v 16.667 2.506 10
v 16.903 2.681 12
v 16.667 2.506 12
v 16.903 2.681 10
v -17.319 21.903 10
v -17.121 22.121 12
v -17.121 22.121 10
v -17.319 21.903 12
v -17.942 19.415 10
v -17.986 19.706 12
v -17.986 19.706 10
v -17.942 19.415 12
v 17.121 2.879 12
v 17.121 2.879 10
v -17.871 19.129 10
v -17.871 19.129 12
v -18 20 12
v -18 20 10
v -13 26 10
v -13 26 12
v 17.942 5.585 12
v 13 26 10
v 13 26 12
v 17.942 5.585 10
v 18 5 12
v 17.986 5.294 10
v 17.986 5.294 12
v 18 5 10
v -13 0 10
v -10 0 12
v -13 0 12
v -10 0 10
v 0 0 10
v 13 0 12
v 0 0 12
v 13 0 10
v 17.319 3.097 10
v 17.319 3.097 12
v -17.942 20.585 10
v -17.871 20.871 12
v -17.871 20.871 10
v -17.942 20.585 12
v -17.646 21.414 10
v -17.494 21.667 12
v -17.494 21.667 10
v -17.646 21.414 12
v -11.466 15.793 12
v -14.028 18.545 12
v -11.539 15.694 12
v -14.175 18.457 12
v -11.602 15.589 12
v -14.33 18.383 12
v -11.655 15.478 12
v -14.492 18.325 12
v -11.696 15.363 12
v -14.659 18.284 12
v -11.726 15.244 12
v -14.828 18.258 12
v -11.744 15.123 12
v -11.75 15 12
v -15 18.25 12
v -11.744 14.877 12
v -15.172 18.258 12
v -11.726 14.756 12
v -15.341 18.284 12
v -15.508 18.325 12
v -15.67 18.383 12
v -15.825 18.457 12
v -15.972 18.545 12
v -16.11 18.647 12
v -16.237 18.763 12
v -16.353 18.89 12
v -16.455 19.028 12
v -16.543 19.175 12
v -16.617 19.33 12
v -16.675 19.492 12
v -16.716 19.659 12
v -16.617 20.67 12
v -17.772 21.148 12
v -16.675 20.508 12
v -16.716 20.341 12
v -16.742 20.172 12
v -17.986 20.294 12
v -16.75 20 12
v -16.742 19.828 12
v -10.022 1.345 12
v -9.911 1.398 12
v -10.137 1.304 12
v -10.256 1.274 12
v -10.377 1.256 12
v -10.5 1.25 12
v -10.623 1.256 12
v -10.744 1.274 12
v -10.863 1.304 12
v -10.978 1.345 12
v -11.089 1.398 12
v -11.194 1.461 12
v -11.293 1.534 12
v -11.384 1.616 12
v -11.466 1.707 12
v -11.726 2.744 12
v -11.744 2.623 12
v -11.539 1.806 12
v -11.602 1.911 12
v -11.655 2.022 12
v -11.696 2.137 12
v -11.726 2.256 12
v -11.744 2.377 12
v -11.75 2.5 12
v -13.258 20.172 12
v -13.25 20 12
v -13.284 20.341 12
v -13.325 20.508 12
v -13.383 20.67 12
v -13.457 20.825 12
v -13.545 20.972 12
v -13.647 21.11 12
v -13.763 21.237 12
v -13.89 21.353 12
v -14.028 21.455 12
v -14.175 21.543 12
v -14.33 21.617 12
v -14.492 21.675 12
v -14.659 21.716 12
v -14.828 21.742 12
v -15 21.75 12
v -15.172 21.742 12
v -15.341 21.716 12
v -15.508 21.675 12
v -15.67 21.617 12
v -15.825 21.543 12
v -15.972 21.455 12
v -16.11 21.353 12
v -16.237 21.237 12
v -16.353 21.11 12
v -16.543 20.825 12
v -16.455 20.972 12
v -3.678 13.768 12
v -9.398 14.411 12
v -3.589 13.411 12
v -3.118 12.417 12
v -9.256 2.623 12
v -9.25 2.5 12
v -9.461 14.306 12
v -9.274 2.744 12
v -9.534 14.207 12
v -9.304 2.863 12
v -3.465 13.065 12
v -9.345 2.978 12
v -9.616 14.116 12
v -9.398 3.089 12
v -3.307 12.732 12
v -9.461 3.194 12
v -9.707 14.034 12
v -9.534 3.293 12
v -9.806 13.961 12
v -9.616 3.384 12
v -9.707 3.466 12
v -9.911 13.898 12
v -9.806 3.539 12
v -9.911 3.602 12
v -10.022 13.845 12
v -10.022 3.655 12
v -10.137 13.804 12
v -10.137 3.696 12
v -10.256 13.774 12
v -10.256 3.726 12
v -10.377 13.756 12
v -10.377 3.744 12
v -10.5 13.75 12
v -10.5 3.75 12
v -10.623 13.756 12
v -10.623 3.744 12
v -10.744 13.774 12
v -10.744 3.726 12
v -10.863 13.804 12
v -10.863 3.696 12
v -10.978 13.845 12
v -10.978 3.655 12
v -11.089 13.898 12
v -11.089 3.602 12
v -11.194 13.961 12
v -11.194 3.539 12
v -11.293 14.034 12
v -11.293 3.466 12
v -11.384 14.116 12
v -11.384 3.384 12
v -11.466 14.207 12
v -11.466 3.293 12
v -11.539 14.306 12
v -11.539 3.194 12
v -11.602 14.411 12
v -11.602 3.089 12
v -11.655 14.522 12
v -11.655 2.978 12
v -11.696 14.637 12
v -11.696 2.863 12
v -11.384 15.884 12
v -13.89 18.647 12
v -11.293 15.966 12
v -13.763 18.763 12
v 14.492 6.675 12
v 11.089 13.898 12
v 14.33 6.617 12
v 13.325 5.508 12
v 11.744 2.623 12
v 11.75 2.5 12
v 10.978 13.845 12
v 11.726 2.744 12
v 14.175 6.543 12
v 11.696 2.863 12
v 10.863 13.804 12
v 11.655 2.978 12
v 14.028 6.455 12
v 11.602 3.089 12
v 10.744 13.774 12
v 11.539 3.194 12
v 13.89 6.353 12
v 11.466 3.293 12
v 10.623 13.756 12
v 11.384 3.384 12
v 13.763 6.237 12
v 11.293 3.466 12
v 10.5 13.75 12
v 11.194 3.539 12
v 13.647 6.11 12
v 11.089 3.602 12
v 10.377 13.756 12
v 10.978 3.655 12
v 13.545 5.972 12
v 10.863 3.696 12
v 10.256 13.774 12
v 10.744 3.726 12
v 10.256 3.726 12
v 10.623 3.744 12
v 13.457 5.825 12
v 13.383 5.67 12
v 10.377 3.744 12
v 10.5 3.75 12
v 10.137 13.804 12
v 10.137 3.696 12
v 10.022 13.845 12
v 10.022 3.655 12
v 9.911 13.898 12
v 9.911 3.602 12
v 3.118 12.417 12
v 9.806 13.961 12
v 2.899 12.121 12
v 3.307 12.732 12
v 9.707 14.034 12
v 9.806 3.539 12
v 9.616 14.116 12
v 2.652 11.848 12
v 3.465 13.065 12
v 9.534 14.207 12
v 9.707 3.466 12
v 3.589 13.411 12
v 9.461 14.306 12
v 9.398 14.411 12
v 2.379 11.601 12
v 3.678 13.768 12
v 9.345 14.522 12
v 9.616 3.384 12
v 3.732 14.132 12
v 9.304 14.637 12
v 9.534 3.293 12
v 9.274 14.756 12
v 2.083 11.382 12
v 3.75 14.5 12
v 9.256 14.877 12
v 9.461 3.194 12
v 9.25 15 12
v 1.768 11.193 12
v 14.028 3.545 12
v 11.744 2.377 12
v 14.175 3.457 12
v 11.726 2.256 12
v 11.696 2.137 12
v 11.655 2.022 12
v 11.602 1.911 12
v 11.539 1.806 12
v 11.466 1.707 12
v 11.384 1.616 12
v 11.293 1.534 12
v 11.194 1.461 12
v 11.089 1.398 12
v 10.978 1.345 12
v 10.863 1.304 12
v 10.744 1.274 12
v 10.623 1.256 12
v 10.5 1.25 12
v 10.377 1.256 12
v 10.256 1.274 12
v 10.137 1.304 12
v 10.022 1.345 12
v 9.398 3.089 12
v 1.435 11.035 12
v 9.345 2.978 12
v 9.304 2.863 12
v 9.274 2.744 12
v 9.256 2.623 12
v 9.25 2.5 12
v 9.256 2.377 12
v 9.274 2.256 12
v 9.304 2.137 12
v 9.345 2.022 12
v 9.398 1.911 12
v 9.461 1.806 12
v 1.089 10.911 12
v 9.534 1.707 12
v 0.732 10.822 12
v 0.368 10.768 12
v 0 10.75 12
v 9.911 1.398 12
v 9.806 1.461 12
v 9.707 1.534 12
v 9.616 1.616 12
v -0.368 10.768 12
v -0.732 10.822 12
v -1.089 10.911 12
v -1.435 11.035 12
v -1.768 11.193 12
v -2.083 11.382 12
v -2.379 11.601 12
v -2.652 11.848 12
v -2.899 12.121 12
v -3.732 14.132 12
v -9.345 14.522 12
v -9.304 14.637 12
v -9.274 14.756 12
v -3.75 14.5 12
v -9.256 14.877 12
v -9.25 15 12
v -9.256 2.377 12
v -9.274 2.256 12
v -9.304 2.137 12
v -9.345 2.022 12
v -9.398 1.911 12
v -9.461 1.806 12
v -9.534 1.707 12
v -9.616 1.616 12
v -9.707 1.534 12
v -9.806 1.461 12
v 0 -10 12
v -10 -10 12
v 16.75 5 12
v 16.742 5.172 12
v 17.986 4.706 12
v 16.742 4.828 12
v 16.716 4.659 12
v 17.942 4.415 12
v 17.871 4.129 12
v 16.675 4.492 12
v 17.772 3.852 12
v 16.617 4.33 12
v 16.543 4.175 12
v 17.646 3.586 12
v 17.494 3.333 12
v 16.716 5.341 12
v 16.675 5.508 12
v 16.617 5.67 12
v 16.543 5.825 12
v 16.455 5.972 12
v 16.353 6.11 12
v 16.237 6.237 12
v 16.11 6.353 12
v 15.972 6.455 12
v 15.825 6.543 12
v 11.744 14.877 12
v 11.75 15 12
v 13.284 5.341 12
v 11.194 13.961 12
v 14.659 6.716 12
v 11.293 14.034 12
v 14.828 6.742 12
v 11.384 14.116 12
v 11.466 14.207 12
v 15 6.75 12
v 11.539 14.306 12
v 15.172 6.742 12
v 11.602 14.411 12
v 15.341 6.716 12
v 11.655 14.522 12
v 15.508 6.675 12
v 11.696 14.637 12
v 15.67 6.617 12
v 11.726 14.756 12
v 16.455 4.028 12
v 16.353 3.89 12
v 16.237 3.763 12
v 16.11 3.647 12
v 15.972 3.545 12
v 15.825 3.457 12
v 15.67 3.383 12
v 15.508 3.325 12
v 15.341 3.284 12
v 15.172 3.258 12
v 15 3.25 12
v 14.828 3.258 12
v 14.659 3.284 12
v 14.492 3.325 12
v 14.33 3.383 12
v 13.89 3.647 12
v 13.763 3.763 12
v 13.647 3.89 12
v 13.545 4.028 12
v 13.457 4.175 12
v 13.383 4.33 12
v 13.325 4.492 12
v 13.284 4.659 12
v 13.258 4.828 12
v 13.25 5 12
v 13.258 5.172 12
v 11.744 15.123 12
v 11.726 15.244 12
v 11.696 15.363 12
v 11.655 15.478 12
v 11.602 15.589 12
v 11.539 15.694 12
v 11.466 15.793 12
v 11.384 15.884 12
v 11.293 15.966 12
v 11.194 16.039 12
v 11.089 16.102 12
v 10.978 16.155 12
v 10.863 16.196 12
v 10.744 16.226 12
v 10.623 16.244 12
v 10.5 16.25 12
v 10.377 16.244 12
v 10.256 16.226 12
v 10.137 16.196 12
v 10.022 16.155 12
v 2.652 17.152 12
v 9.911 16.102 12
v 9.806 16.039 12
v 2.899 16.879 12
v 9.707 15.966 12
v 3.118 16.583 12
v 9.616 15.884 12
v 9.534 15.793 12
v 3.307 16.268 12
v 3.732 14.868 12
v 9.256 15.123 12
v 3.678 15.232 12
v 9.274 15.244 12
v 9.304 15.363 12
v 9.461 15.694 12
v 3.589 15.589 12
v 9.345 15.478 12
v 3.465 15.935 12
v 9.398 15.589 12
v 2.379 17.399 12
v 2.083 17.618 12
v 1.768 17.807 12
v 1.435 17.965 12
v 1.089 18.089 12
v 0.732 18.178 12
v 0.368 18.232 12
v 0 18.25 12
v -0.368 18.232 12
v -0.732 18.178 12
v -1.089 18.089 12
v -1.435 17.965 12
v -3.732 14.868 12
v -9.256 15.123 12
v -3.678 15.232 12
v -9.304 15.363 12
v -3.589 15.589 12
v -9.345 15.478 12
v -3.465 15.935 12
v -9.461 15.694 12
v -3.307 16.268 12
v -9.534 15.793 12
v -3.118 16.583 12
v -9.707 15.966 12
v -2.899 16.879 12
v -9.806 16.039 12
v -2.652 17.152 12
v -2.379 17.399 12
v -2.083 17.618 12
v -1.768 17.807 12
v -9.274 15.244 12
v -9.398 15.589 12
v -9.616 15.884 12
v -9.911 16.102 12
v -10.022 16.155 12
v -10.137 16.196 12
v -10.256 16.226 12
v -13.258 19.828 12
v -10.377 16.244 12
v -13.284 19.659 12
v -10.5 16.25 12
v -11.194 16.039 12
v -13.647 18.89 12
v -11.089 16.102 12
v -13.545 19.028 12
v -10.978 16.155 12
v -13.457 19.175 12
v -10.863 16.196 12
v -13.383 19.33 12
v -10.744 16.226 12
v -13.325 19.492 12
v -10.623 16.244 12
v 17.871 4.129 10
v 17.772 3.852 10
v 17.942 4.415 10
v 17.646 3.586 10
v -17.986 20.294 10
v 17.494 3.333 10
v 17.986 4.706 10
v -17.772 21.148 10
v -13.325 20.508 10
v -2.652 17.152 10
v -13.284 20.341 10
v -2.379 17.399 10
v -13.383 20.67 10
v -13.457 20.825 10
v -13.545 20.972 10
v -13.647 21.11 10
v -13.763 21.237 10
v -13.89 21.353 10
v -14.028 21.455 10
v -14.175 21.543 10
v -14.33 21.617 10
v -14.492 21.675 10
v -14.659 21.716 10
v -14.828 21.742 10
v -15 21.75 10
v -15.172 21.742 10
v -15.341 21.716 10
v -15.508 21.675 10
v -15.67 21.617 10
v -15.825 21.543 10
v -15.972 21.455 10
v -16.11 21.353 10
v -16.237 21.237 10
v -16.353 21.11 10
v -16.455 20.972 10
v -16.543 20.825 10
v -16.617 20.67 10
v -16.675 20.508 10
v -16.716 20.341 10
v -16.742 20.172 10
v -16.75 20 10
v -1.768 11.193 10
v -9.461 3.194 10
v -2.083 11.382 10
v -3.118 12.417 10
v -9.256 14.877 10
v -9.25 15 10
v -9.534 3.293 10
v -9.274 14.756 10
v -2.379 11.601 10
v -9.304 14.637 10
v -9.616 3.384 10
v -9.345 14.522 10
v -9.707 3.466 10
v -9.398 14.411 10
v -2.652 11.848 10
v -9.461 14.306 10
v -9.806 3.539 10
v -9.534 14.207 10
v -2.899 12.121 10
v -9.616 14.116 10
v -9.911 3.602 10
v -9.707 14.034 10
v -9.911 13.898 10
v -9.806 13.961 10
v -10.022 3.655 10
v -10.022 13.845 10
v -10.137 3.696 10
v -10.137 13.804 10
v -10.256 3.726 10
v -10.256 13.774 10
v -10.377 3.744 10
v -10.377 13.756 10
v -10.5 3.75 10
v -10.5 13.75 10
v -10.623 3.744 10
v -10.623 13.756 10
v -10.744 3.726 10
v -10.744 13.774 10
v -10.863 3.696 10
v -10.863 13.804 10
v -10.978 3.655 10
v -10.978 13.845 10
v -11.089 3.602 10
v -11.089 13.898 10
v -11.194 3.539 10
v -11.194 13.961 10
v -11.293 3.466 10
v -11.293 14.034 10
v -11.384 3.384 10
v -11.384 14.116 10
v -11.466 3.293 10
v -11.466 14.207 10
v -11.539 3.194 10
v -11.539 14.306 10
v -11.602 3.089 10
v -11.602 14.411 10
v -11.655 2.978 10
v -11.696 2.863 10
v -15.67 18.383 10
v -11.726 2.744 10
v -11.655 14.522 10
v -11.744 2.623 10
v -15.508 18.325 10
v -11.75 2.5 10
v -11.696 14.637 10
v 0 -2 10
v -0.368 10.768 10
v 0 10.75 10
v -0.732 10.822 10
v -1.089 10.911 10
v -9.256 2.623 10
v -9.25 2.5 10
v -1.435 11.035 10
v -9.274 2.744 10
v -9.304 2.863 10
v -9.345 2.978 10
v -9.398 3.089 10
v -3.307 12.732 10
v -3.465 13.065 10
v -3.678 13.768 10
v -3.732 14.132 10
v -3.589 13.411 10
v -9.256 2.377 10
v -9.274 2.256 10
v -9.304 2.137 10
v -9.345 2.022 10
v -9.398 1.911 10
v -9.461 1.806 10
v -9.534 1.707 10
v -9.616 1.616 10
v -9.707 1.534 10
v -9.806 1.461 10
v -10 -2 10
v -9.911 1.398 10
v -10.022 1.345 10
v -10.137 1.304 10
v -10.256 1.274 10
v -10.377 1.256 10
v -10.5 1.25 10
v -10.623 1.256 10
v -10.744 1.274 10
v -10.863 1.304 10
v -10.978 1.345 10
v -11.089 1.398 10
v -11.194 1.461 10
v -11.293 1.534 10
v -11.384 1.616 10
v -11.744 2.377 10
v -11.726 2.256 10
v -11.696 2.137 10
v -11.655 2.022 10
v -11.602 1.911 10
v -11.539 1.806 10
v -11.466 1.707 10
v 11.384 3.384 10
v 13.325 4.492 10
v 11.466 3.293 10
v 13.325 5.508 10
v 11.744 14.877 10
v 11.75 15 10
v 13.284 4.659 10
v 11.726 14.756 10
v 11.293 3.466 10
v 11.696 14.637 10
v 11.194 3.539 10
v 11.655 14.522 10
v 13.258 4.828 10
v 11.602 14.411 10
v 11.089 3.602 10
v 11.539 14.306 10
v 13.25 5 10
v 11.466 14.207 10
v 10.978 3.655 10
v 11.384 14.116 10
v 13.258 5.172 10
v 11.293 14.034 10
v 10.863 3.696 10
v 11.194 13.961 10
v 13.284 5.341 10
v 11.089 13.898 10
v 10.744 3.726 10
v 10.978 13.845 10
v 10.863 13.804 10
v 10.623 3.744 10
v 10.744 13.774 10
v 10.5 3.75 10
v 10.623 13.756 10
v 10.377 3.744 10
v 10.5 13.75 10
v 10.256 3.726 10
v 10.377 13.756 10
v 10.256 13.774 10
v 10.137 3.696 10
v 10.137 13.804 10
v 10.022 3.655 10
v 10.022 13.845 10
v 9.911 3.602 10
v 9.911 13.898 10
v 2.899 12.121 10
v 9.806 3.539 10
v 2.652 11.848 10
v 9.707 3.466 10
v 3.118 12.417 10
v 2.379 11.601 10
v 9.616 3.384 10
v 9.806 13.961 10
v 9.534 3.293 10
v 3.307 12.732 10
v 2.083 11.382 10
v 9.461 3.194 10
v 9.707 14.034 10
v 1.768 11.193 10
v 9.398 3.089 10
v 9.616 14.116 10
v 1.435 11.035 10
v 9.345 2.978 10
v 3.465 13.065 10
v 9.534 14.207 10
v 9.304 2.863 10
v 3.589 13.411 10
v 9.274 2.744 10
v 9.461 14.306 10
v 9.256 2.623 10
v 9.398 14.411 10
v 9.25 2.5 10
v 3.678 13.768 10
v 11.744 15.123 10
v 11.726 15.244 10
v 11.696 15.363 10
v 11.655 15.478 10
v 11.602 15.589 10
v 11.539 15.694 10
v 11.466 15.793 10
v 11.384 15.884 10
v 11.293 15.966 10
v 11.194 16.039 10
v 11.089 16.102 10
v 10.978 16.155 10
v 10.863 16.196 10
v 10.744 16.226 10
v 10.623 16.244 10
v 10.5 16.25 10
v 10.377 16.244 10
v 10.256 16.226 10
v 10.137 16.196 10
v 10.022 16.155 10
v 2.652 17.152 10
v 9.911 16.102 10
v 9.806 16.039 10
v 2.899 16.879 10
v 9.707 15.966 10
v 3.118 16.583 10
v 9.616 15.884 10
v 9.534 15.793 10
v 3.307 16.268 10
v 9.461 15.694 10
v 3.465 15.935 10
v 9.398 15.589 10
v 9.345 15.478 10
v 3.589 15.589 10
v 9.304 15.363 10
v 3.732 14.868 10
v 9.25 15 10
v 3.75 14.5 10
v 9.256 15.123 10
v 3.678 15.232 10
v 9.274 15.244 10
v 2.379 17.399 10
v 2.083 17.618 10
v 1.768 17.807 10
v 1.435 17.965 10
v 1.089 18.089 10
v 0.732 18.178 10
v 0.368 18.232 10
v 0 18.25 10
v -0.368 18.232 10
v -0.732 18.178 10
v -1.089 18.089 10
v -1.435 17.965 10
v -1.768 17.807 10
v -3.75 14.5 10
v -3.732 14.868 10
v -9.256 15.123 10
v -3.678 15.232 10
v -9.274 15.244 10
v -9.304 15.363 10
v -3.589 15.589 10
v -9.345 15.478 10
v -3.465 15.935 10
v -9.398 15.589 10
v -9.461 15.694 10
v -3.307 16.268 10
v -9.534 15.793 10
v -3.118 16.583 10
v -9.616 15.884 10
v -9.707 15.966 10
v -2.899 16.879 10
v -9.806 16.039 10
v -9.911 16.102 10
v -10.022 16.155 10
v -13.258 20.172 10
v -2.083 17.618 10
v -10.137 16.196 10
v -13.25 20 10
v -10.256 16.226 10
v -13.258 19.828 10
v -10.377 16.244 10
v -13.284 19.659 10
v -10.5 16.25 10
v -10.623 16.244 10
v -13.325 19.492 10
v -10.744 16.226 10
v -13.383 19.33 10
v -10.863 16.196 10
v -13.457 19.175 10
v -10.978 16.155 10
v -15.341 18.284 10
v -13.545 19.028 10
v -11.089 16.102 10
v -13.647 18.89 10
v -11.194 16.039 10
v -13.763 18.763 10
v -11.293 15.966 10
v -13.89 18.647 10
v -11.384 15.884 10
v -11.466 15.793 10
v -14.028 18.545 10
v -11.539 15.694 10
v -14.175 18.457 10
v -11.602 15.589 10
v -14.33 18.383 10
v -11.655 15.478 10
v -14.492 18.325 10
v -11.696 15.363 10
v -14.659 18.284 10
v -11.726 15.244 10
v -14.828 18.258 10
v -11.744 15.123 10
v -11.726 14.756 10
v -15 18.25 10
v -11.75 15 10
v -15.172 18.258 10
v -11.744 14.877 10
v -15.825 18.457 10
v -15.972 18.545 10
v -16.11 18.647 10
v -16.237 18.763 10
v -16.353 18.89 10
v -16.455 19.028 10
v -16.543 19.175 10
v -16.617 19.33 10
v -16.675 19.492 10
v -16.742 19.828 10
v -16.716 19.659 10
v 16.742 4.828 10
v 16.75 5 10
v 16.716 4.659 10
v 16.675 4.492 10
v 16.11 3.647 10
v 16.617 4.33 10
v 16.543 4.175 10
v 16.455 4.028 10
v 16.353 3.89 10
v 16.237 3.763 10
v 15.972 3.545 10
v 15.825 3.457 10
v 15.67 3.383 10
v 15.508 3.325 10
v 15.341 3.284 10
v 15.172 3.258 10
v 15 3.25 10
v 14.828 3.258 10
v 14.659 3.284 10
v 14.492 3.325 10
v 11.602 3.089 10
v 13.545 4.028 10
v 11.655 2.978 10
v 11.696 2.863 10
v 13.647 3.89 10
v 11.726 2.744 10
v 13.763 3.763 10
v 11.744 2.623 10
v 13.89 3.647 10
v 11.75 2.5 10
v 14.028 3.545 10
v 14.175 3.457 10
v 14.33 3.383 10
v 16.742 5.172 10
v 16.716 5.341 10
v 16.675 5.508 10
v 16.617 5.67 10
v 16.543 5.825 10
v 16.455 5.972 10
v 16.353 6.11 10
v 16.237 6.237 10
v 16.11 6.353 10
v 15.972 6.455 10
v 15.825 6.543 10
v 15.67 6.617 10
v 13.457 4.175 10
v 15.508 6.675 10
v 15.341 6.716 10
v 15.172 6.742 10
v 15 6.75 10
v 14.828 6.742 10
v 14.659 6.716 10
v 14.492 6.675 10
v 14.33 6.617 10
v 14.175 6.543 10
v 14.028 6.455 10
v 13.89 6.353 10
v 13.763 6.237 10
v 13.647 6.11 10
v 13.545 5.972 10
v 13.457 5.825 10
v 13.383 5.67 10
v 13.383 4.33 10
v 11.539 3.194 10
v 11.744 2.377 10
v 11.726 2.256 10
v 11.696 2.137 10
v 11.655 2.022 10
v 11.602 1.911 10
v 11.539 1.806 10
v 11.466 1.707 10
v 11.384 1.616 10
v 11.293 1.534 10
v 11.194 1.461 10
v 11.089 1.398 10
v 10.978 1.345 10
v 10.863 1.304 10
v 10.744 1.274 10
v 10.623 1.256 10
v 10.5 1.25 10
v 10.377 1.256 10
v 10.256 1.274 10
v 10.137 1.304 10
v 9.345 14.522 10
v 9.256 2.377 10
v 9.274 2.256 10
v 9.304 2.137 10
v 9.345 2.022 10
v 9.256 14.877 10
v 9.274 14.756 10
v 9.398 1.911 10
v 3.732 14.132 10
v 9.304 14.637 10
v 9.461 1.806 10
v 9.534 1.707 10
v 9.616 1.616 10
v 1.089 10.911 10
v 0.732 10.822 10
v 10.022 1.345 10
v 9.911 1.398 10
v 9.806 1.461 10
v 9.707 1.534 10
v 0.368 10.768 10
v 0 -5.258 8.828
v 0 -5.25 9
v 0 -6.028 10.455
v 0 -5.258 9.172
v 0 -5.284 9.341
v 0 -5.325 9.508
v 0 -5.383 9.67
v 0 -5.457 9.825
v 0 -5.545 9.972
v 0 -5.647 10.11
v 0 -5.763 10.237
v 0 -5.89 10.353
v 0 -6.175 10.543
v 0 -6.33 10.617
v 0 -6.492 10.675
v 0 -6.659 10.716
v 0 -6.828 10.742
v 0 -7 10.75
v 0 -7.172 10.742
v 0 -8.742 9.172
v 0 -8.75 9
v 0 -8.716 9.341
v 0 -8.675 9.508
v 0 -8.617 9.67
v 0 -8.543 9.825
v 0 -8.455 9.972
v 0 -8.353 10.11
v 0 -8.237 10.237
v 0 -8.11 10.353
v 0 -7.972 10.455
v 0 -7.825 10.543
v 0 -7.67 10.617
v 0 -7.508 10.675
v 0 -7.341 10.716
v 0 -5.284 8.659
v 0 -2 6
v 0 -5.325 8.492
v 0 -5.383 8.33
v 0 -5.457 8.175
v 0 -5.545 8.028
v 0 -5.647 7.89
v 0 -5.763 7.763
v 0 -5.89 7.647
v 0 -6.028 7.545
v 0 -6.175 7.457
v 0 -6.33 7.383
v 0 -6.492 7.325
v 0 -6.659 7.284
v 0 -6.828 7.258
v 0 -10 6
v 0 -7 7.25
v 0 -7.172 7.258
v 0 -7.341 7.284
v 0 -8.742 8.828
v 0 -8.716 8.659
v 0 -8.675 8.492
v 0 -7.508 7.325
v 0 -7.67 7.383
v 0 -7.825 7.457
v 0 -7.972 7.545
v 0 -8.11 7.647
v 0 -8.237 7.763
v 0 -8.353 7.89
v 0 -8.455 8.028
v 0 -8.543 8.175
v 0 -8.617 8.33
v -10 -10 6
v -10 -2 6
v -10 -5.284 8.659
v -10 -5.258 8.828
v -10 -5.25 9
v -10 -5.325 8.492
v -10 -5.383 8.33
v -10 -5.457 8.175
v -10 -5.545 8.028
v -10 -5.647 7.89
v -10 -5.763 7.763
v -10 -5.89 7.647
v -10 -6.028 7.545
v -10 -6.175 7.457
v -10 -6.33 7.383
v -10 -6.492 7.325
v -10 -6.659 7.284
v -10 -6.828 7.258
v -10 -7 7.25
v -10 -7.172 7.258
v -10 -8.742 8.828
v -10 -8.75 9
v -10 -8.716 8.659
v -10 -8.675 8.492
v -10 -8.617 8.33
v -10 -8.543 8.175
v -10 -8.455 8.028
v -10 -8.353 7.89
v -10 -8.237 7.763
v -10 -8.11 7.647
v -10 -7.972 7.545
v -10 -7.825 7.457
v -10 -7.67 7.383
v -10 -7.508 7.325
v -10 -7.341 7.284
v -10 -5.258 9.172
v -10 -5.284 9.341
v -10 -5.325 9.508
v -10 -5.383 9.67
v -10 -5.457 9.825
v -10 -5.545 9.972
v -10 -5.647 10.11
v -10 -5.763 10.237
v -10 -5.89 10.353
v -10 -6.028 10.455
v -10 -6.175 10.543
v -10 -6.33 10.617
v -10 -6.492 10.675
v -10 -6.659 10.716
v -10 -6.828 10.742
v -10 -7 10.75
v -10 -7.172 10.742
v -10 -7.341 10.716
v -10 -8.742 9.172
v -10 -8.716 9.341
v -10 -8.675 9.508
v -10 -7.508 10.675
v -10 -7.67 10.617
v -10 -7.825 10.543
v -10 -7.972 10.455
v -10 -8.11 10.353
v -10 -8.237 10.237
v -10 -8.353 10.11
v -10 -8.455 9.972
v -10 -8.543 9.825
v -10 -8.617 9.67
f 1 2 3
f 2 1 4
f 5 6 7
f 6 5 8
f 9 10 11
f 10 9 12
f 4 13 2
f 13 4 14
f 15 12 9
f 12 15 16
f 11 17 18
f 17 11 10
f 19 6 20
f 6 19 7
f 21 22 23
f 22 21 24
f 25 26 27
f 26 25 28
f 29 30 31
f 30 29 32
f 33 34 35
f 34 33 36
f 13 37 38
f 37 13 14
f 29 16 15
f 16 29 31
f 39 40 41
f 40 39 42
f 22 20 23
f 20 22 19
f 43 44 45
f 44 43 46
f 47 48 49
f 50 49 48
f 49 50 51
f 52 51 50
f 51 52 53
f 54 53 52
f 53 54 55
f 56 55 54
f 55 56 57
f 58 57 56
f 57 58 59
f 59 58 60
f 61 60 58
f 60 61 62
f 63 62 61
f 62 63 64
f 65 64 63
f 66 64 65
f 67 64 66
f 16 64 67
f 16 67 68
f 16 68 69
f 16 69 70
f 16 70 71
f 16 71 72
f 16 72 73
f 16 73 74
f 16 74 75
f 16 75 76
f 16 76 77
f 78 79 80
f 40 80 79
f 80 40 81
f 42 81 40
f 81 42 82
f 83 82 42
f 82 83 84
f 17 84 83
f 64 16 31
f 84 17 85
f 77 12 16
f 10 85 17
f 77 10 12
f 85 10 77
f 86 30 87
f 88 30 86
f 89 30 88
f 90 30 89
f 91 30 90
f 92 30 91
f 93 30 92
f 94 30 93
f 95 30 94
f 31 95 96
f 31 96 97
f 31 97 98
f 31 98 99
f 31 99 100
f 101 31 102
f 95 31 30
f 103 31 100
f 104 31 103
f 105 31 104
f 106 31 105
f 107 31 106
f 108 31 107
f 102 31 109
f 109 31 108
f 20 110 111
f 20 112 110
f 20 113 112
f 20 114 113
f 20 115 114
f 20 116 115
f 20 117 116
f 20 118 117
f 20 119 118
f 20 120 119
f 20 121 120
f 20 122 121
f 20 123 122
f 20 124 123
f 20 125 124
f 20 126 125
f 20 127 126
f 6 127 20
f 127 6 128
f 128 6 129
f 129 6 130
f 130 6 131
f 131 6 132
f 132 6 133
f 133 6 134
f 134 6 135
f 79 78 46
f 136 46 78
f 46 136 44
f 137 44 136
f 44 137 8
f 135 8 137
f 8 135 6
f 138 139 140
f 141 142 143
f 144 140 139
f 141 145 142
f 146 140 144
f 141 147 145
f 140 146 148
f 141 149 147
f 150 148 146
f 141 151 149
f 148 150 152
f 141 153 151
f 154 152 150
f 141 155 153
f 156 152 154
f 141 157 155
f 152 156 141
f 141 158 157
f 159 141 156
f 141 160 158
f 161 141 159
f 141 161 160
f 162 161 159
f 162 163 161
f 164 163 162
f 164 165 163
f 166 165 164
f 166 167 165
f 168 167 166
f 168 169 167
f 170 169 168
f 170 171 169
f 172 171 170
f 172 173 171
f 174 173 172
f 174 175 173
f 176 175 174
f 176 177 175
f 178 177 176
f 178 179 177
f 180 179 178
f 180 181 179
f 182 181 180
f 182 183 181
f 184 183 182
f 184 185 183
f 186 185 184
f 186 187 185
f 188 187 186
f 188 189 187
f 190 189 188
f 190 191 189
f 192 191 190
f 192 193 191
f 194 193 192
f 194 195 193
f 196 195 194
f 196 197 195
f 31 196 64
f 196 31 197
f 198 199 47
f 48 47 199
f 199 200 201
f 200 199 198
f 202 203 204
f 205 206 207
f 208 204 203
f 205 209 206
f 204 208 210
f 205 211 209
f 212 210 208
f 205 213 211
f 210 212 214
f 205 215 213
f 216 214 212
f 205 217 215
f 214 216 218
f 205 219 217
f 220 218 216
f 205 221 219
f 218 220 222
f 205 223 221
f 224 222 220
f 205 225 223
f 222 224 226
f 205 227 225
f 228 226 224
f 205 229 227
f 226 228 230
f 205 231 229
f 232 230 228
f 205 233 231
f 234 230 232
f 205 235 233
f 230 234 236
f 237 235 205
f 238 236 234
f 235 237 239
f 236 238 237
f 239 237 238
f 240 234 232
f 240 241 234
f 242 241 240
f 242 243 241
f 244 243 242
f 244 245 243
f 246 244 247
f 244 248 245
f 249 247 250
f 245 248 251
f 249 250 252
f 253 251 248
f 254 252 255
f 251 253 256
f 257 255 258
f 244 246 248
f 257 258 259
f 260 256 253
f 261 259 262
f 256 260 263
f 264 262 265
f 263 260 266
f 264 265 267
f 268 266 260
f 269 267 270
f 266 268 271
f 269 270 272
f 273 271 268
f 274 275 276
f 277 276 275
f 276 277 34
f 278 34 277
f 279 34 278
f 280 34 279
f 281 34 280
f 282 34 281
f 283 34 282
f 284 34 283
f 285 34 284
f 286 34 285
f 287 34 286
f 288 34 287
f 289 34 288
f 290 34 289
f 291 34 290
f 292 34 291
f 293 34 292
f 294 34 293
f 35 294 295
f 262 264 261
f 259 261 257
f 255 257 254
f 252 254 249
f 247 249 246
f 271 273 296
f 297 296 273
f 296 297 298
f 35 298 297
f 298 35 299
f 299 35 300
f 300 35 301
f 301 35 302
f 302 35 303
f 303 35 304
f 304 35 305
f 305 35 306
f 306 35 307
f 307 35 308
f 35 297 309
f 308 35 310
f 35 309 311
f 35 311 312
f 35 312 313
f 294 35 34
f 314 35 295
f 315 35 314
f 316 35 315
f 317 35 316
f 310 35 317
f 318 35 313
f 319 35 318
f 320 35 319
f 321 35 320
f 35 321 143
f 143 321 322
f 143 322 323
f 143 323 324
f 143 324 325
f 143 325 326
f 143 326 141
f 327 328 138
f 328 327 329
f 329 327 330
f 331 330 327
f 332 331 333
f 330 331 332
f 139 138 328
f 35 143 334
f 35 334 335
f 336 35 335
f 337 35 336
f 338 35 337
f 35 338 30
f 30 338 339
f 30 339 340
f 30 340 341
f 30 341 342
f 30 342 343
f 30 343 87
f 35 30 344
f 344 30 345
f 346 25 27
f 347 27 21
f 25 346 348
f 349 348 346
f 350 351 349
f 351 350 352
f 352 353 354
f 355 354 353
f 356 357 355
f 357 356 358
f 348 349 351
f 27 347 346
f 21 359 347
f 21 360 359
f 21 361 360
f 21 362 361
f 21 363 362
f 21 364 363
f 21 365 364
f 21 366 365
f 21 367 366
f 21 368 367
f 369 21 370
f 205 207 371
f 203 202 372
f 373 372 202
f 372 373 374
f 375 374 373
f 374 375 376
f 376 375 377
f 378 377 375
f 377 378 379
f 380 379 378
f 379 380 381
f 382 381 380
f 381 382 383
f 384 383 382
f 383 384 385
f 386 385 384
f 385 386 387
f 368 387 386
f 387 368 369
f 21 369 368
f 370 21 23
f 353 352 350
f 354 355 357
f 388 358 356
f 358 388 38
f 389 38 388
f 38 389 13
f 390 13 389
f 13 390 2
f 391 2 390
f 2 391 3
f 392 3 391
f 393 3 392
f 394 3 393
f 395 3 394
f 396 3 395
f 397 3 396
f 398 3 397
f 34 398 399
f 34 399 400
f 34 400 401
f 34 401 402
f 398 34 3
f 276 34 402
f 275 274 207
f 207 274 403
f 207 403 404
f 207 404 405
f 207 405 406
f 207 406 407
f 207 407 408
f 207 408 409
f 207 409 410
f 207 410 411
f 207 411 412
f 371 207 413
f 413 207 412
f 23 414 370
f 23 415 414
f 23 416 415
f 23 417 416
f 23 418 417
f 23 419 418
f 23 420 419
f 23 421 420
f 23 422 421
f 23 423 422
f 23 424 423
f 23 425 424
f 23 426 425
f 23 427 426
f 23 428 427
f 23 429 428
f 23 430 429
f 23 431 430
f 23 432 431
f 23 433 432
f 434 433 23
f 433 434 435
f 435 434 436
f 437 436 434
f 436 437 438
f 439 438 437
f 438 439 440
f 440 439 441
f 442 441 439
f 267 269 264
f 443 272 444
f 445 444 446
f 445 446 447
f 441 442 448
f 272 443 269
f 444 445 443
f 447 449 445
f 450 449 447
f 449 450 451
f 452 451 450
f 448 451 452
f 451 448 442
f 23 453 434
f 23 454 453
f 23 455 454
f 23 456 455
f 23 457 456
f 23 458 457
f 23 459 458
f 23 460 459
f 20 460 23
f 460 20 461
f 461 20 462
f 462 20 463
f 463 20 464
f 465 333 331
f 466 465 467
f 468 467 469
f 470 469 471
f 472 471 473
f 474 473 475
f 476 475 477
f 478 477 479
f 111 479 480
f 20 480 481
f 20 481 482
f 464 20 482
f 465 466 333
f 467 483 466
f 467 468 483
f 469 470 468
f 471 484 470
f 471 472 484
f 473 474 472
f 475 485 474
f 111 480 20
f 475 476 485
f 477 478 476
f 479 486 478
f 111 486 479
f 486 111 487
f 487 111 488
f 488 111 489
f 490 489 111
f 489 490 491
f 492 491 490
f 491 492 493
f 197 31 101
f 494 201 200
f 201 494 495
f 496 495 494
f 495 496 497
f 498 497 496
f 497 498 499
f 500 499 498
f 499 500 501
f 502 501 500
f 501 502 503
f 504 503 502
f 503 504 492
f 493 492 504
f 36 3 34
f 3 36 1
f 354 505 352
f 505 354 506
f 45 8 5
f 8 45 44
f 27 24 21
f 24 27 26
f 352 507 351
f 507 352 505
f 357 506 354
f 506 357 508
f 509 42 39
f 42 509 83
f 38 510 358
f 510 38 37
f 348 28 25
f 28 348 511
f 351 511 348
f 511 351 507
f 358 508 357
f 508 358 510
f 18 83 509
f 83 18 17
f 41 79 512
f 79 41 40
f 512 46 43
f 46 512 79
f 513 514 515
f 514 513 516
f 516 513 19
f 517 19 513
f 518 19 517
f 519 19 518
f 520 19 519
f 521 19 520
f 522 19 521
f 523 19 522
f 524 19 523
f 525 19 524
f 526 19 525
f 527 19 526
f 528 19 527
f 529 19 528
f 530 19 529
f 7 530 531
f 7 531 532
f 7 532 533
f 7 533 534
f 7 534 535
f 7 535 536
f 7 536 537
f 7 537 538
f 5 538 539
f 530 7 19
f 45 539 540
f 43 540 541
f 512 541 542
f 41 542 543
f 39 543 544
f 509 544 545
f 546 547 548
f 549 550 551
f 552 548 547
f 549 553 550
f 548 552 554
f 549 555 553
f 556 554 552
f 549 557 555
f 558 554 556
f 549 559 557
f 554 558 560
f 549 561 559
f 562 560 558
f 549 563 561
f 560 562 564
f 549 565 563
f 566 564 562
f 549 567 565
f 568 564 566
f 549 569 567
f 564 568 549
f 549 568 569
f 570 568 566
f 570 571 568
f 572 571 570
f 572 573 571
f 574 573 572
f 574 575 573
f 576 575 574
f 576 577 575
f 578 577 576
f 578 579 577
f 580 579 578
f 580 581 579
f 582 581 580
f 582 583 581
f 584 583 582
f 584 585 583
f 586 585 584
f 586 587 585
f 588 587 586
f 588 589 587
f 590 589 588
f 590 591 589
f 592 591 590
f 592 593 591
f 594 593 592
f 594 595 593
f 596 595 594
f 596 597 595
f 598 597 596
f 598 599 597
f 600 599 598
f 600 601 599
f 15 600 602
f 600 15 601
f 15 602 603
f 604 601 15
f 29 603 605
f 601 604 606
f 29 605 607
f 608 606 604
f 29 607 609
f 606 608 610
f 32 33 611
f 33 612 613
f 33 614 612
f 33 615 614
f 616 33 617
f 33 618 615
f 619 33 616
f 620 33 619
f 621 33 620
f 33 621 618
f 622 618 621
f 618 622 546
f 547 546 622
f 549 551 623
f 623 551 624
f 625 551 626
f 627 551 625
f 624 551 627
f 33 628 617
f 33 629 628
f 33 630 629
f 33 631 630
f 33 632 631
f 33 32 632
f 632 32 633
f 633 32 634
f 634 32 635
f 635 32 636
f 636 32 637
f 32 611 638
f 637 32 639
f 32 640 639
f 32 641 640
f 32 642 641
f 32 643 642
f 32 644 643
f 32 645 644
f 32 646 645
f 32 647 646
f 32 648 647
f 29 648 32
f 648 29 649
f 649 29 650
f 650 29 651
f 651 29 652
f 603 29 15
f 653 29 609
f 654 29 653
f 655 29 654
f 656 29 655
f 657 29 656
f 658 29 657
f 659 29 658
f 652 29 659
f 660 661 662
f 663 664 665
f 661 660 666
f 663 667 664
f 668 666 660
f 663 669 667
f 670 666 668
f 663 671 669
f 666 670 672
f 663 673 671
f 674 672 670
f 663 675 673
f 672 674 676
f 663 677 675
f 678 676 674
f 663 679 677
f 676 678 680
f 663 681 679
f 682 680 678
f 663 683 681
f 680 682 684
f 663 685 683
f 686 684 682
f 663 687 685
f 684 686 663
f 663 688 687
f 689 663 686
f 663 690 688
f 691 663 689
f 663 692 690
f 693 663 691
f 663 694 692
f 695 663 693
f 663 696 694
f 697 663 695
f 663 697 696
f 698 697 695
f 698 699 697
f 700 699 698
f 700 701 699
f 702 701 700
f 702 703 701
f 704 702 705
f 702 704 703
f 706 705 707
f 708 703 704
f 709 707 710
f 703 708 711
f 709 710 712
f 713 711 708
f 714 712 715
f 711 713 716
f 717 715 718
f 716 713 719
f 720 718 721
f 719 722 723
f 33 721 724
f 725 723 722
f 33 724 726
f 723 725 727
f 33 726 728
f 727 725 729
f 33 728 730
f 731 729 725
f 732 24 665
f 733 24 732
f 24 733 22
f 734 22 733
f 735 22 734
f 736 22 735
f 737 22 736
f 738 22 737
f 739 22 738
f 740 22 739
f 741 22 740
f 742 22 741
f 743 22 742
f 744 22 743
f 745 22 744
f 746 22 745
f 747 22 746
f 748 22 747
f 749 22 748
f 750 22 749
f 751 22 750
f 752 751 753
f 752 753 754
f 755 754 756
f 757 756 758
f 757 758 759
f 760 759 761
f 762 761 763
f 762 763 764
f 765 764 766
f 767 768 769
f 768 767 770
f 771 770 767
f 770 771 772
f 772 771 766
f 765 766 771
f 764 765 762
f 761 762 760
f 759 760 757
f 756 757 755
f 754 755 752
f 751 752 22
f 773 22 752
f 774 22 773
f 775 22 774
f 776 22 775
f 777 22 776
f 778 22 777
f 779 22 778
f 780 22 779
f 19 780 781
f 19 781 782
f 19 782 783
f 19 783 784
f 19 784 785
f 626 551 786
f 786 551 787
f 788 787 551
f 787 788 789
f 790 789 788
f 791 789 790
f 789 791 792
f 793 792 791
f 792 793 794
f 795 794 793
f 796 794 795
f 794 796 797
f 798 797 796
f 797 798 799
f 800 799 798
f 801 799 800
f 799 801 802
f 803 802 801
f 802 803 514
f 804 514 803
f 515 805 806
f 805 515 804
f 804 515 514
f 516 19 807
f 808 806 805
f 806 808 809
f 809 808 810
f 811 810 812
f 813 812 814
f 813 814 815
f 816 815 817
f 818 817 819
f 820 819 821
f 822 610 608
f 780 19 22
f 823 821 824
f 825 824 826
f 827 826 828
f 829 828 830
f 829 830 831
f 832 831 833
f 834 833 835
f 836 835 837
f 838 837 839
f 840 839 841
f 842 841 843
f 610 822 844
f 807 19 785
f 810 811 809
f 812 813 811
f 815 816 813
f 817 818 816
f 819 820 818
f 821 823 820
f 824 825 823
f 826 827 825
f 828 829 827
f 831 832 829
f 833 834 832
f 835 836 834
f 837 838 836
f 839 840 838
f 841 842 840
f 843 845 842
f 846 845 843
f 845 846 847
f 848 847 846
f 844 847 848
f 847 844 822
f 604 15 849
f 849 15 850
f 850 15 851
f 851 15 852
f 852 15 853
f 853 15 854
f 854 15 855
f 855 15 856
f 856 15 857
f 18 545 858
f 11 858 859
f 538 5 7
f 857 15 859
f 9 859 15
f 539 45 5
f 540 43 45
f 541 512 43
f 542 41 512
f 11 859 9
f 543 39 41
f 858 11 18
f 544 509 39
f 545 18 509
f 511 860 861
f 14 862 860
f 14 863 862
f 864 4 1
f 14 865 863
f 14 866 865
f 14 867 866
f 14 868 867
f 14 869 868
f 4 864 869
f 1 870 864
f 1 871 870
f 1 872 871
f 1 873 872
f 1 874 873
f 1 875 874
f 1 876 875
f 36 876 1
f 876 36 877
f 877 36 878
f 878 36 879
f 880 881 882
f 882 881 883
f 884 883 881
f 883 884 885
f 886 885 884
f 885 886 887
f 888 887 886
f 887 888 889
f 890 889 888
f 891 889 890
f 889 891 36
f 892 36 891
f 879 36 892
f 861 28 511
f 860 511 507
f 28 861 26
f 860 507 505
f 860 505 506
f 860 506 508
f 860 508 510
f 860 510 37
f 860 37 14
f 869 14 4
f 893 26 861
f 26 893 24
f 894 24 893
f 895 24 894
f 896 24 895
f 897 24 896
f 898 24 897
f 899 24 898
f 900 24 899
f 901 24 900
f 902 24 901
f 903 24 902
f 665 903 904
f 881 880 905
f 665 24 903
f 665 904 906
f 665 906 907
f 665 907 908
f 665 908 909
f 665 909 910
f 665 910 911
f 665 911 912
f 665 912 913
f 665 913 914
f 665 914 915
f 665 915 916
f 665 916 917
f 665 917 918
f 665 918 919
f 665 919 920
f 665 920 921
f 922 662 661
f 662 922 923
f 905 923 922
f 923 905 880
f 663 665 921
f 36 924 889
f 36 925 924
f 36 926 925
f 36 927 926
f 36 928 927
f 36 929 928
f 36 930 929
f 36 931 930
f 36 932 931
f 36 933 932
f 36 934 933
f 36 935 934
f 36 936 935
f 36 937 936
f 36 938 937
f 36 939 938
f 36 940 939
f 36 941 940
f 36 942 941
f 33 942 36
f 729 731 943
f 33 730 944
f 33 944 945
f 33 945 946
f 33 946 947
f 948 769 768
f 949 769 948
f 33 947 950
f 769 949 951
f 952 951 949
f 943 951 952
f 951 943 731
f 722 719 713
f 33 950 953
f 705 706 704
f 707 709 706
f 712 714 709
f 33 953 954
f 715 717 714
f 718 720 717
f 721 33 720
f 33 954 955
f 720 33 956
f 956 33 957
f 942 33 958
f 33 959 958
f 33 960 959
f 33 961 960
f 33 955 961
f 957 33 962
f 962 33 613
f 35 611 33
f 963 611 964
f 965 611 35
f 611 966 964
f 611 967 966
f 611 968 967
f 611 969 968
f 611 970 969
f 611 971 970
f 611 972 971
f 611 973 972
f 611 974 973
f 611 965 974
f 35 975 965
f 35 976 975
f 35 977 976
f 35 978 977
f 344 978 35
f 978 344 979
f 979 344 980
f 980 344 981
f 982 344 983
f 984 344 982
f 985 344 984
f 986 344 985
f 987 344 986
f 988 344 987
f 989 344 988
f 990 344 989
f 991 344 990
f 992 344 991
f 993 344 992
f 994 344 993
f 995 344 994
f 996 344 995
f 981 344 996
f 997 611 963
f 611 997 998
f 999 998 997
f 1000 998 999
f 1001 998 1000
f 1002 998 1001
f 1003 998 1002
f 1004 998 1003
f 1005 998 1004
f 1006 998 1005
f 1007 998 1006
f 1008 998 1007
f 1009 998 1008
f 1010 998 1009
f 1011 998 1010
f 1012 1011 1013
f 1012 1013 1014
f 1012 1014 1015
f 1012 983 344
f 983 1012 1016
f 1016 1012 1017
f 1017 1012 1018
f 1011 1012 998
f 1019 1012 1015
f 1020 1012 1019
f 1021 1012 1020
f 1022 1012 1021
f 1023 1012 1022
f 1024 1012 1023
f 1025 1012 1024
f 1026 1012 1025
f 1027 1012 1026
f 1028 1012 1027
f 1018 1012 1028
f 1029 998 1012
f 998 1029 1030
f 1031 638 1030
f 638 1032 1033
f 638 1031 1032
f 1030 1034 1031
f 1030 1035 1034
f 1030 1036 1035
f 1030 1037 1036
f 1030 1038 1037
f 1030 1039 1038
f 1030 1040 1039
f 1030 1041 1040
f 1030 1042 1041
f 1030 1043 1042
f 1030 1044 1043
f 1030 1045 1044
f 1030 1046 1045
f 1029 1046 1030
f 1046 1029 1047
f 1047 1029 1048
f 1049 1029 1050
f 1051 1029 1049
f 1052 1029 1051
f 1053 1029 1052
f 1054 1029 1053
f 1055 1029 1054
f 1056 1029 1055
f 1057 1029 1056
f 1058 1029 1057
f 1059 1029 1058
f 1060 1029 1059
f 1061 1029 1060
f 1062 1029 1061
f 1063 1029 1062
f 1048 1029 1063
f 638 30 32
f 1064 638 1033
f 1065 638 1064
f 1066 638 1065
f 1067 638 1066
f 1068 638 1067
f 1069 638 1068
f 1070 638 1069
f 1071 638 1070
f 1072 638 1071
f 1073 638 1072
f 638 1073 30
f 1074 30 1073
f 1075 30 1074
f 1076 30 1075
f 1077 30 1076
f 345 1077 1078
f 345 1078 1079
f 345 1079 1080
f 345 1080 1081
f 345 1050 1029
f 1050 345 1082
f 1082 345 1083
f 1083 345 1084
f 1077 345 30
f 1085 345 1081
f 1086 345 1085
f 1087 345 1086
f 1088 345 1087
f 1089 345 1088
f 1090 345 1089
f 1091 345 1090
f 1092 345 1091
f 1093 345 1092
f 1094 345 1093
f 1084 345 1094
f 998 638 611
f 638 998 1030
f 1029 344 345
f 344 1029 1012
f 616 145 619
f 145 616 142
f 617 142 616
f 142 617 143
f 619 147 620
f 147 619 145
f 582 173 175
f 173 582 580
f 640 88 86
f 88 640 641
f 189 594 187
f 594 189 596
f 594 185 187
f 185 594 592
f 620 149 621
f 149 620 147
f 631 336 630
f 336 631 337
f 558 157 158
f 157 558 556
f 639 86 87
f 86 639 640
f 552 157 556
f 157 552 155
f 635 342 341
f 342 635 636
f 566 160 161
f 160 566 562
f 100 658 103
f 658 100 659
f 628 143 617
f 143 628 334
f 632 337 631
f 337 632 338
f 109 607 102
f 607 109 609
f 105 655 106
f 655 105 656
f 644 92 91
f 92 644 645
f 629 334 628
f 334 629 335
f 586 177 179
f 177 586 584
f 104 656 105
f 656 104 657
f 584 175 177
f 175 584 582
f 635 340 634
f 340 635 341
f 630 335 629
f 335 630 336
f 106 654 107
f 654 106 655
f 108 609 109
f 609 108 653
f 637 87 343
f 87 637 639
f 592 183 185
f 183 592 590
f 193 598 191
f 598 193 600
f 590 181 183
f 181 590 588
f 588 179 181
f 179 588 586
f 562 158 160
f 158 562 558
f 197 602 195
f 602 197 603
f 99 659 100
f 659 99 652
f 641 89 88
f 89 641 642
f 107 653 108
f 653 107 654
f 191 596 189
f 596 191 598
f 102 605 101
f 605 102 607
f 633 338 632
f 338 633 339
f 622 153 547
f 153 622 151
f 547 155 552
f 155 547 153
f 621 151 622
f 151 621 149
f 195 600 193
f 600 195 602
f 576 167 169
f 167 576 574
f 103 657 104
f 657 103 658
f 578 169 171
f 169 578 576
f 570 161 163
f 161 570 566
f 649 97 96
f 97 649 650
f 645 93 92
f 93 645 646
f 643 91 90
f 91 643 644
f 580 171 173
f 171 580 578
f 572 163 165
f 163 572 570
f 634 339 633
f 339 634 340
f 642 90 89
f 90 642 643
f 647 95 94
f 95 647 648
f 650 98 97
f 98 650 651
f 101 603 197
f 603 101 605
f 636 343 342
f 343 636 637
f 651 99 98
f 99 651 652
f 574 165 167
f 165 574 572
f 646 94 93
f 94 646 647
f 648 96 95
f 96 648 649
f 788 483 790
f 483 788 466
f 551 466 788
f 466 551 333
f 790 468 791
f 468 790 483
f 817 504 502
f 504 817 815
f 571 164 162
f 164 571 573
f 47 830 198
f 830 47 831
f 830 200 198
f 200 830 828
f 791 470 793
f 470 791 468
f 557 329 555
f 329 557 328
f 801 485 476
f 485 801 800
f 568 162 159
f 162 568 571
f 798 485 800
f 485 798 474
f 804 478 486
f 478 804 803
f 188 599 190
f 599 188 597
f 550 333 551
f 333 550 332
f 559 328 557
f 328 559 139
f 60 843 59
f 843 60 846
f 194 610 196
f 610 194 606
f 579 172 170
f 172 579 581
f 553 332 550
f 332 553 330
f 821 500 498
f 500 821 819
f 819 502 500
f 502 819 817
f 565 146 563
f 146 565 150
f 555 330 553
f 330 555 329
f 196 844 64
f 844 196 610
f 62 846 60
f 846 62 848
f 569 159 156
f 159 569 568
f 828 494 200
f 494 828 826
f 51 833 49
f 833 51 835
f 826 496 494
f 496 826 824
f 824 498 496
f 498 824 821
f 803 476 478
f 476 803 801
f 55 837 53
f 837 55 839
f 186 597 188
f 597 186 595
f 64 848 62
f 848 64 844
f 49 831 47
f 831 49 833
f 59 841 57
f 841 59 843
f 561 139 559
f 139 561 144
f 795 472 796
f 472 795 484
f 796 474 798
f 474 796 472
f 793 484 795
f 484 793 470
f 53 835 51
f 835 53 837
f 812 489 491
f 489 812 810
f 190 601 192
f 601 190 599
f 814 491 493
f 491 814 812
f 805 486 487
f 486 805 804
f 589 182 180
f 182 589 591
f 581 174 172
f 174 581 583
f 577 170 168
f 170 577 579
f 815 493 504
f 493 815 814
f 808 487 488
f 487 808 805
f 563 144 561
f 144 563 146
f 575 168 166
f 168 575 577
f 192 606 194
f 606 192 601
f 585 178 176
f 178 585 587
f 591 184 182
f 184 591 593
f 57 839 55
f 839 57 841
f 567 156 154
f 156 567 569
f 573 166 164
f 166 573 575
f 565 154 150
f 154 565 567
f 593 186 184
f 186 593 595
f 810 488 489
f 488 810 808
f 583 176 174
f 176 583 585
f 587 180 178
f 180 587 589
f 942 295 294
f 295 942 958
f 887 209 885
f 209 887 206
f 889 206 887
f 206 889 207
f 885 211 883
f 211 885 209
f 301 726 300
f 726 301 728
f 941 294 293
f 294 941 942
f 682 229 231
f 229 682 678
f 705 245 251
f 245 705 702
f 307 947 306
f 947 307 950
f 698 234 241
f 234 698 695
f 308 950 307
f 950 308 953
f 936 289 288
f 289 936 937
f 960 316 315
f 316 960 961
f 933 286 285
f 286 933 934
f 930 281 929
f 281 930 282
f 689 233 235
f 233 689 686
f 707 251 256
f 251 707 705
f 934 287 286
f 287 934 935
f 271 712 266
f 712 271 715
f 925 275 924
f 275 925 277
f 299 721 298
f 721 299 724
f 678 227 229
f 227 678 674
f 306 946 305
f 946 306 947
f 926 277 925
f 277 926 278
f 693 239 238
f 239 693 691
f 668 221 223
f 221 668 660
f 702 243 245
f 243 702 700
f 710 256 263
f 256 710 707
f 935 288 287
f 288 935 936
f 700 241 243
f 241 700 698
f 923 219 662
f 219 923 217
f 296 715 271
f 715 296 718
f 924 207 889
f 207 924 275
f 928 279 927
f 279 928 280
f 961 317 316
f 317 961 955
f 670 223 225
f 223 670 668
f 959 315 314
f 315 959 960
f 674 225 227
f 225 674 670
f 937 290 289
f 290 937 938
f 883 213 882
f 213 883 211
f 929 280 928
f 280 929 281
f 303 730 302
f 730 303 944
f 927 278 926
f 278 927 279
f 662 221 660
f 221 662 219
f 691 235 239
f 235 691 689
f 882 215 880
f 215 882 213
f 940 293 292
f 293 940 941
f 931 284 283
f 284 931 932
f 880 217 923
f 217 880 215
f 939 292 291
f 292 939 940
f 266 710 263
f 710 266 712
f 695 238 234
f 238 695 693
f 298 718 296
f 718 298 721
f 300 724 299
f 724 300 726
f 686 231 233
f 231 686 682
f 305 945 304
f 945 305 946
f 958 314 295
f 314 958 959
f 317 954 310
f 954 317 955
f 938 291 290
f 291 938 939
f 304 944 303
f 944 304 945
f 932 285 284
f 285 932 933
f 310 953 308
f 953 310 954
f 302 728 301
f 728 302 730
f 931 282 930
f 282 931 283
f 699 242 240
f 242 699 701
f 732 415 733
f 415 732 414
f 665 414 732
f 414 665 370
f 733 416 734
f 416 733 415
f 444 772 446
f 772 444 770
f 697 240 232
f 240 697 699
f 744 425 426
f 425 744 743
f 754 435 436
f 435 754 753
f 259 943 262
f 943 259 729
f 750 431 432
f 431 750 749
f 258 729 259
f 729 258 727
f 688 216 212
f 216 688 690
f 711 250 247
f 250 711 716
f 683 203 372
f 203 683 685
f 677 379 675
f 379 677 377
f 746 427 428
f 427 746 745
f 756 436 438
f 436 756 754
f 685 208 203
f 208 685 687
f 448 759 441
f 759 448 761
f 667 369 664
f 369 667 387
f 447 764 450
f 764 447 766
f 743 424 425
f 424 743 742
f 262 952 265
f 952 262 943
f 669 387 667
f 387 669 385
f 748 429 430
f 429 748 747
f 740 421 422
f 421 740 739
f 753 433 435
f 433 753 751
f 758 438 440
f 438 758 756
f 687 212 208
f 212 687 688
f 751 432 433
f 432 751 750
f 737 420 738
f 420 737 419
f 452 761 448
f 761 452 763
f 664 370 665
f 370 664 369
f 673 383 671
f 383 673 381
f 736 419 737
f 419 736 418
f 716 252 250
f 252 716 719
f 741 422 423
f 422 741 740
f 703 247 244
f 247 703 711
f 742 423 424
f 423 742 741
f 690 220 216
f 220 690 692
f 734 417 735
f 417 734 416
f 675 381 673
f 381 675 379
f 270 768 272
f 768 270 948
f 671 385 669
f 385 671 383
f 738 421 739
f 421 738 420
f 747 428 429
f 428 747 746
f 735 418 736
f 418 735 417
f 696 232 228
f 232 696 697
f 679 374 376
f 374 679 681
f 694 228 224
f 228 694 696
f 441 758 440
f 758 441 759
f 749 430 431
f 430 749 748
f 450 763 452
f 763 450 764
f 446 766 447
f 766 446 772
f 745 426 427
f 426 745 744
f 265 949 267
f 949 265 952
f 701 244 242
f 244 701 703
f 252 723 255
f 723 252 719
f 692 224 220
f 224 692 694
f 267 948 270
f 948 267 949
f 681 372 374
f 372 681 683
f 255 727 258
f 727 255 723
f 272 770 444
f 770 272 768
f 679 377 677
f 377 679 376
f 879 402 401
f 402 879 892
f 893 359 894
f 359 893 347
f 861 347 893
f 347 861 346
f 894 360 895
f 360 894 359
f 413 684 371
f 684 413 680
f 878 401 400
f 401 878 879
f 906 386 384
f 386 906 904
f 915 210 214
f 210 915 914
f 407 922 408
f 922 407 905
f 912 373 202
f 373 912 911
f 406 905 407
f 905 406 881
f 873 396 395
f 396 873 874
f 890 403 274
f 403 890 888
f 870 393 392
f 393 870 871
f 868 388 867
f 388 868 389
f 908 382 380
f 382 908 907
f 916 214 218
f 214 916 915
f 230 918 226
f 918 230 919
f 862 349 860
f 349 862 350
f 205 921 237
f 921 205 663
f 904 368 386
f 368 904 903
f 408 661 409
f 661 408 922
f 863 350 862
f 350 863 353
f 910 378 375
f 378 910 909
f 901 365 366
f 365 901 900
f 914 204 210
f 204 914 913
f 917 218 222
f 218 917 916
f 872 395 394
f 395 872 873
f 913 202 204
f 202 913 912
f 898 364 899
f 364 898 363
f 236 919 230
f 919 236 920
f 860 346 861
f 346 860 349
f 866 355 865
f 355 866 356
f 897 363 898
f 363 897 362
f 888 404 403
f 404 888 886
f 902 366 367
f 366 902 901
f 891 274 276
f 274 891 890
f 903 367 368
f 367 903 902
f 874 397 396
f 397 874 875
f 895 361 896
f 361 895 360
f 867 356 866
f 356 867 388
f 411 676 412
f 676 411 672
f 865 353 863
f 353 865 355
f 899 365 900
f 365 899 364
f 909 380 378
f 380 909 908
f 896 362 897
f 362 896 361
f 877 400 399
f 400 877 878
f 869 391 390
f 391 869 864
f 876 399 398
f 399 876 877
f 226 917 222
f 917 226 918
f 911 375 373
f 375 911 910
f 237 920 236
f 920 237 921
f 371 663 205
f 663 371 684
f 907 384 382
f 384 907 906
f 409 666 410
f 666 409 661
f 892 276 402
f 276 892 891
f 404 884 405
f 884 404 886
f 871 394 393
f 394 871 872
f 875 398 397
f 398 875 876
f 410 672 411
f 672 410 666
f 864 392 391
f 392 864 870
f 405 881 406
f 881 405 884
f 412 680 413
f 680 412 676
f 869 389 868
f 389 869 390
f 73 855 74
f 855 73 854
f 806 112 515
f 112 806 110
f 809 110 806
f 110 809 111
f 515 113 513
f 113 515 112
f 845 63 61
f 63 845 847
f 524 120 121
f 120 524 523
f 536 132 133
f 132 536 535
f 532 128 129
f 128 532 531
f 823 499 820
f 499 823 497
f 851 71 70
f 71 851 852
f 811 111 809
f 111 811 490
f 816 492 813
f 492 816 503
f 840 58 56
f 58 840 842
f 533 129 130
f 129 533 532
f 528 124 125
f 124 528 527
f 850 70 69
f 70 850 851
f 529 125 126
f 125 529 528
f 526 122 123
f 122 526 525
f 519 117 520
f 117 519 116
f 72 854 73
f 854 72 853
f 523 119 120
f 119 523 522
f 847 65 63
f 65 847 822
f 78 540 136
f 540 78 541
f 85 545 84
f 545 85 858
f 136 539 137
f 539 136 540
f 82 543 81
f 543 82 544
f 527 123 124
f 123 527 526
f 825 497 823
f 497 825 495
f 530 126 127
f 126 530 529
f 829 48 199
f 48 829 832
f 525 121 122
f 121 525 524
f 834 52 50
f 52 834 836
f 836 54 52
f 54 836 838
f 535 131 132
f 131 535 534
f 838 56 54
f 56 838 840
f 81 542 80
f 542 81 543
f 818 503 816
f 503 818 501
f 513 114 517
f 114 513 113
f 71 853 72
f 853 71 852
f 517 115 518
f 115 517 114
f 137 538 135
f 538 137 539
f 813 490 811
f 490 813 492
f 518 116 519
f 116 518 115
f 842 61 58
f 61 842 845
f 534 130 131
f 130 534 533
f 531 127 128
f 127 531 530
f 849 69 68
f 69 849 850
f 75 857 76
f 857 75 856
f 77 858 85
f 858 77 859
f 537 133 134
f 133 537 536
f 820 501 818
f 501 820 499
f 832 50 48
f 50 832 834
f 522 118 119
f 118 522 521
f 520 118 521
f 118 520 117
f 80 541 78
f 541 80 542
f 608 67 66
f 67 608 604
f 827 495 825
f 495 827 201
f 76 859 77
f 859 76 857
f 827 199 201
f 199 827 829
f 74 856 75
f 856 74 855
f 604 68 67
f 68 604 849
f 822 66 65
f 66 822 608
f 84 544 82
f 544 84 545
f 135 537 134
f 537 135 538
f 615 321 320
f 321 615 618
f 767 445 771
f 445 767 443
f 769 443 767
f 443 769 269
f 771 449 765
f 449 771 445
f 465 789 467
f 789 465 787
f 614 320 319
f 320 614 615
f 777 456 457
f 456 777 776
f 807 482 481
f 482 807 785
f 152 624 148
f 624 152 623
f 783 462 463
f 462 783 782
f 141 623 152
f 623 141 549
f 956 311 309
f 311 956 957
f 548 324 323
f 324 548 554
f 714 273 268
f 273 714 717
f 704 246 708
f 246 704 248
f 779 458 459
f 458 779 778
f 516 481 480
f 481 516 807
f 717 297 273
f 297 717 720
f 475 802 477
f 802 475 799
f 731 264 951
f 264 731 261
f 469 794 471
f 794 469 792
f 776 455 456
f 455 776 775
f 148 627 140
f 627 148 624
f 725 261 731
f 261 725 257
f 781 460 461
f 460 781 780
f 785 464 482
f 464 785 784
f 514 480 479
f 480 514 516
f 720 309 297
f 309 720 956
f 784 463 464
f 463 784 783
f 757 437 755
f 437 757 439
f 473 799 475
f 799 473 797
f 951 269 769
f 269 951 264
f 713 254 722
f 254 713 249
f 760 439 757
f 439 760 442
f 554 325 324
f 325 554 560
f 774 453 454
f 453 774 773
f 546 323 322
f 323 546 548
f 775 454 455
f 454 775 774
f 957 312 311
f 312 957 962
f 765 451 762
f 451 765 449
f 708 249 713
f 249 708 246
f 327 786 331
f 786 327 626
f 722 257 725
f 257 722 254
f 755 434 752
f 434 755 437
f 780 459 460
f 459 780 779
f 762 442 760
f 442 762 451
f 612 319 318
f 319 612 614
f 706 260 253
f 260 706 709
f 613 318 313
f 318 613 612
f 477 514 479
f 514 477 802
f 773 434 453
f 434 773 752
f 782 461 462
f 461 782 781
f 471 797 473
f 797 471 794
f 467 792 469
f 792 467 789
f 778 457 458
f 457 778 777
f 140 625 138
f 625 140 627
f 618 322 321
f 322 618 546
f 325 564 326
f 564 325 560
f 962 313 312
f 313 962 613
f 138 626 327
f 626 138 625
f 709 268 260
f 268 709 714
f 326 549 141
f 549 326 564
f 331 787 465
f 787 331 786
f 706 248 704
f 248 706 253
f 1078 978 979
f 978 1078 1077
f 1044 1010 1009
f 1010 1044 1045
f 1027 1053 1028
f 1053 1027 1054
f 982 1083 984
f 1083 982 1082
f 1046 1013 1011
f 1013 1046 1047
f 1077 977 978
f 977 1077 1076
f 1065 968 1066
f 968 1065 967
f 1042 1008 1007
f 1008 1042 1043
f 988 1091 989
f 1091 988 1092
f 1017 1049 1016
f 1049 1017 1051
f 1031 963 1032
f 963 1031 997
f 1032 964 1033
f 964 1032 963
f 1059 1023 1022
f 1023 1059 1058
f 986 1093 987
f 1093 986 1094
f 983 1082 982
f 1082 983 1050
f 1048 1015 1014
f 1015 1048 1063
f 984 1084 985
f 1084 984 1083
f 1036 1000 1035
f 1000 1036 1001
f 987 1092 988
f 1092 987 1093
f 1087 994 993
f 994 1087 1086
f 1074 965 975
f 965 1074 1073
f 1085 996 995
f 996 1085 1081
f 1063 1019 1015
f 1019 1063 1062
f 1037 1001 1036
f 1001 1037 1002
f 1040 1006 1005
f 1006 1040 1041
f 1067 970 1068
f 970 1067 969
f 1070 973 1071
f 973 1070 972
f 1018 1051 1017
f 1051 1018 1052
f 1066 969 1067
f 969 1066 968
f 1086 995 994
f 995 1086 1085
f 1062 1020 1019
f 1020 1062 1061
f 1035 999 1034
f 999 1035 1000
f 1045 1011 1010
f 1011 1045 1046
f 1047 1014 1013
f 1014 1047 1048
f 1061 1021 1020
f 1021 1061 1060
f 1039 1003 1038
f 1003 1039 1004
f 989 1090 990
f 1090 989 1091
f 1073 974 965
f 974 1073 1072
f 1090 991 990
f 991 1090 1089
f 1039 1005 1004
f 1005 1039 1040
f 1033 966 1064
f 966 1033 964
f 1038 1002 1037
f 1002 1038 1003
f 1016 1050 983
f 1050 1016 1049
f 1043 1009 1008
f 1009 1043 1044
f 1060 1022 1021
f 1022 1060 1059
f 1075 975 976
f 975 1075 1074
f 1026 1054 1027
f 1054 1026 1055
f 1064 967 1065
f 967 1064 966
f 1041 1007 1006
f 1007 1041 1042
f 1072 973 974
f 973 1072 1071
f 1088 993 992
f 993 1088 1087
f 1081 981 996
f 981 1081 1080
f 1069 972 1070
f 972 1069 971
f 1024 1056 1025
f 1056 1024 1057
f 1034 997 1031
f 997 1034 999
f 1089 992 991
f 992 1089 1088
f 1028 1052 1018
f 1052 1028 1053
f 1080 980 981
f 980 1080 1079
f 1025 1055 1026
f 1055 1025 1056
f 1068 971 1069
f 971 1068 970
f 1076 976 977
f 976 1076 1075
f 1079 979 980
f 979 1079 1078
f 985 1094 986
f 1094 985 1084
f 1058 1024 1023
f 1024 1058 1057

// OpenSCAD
//21v2v12
//9x9x7x3.5x5
$fn=64;

module mount_piles(height = 6, d_add = 0) {
   for(x=[-21/2,21/2]) {
      for(y=[2,14.5]) translate([x,y+0.5,0]) cylinder(d=1.9+d_add,h=height,center=false);
   }
}

module screw_mount() {
   translate([15,5,-50]) cylinder(d=3.5,h=100,center=false);
   translate([-15,20,-50]) cylinder(d=3.5,h=100,center=false);
}

module bottom() {
   difference() {
      union() {
         hull() {
            translate([-26/2,0,-2]) cube([26,26,2],false);
            translate([15,5,-2]) cylinder(d=6,h=2,center=false);
            translate([-15,20,-2]) cylinder(d=6,h=2,center=false);
         }
         mount_piles(6,0);
         for(x=[-21/2,21/2]) {
            translate([x,8.5,1.75]) cube([1,12,3.5],true);
         }
      }
      screw_mount();
   }
}

module top() {
   difference() {
      union() {
         hull() {
            translate([-26/2,0,0]) cube([26,26,2],false);
            translate([15,5,0]) cylinder(d=6,h=2,center=false);
            translate([-15,20,0]) cylinder(d=6,h=2,center=false);
         }
         translate([-10,-10,-4]) cube([10,8,6],false);
         translate([-10,-10,0]) cube([10,10,2],false);
      }
      translate([0,14.5,-1]) cylinder(d=7.5,h=4,center=false);
      translate([0,0,-1]) mount_piles(6,0.6);
      screw_mount();
      translate([-10.1,-7,-1]) rotate([0,90,0]) cylinder(d=3.5,h=10.2,center=false);
   }
}

module arm() {
   difference() {
      hull() {
         translate([0,-8,-4]) cube([10,6,6],false);
         translate([2,-14,-10]) cube([6,12,6],false);
      }
      translate([-0.1,-5,-1]) rotate([0,90,0]) cylinder(d=3.5,h=10.2,center=false);
      translate([5,-5,-1]) rotate([0,90,0]) cylinder(d=4.4,h=10.2,center=false);
      translate([5,-14.1,-7]) rotate([-90,0,0]) cylinder(d=3.5,h=12.2,center=false);
      translate([5,-7,-7]) rotate([-90,0,0]) cylinder(d=4.4,h=12.2,center=false);
   }
}

module 3030_mount() {
   difference() {
      union() {
         translate([-10,-40,-7]) cube([30,20,4],false);
         hull() {
            translate([-10,-24,-7]) cube([30,4,4],false);
            translate([2,-24,0]) cube([6,10,6],false);
         }
      }
      translate([5,-24.1,3]) rotate([-90,0,0]) cylinder(d=3.5,h=12.2,center=false);
      translate([15,-32,-8]) cylinder(d=6,h=10,center=false);
      translate([-5,-32,-8]) cylinder(d=6,h=10,center=false);
   }
}

//bottom();
translate([0,0,10]) top();
//translate([0,-2,10]) arm();
//translate([0,-2,0]) 3030_mount();
